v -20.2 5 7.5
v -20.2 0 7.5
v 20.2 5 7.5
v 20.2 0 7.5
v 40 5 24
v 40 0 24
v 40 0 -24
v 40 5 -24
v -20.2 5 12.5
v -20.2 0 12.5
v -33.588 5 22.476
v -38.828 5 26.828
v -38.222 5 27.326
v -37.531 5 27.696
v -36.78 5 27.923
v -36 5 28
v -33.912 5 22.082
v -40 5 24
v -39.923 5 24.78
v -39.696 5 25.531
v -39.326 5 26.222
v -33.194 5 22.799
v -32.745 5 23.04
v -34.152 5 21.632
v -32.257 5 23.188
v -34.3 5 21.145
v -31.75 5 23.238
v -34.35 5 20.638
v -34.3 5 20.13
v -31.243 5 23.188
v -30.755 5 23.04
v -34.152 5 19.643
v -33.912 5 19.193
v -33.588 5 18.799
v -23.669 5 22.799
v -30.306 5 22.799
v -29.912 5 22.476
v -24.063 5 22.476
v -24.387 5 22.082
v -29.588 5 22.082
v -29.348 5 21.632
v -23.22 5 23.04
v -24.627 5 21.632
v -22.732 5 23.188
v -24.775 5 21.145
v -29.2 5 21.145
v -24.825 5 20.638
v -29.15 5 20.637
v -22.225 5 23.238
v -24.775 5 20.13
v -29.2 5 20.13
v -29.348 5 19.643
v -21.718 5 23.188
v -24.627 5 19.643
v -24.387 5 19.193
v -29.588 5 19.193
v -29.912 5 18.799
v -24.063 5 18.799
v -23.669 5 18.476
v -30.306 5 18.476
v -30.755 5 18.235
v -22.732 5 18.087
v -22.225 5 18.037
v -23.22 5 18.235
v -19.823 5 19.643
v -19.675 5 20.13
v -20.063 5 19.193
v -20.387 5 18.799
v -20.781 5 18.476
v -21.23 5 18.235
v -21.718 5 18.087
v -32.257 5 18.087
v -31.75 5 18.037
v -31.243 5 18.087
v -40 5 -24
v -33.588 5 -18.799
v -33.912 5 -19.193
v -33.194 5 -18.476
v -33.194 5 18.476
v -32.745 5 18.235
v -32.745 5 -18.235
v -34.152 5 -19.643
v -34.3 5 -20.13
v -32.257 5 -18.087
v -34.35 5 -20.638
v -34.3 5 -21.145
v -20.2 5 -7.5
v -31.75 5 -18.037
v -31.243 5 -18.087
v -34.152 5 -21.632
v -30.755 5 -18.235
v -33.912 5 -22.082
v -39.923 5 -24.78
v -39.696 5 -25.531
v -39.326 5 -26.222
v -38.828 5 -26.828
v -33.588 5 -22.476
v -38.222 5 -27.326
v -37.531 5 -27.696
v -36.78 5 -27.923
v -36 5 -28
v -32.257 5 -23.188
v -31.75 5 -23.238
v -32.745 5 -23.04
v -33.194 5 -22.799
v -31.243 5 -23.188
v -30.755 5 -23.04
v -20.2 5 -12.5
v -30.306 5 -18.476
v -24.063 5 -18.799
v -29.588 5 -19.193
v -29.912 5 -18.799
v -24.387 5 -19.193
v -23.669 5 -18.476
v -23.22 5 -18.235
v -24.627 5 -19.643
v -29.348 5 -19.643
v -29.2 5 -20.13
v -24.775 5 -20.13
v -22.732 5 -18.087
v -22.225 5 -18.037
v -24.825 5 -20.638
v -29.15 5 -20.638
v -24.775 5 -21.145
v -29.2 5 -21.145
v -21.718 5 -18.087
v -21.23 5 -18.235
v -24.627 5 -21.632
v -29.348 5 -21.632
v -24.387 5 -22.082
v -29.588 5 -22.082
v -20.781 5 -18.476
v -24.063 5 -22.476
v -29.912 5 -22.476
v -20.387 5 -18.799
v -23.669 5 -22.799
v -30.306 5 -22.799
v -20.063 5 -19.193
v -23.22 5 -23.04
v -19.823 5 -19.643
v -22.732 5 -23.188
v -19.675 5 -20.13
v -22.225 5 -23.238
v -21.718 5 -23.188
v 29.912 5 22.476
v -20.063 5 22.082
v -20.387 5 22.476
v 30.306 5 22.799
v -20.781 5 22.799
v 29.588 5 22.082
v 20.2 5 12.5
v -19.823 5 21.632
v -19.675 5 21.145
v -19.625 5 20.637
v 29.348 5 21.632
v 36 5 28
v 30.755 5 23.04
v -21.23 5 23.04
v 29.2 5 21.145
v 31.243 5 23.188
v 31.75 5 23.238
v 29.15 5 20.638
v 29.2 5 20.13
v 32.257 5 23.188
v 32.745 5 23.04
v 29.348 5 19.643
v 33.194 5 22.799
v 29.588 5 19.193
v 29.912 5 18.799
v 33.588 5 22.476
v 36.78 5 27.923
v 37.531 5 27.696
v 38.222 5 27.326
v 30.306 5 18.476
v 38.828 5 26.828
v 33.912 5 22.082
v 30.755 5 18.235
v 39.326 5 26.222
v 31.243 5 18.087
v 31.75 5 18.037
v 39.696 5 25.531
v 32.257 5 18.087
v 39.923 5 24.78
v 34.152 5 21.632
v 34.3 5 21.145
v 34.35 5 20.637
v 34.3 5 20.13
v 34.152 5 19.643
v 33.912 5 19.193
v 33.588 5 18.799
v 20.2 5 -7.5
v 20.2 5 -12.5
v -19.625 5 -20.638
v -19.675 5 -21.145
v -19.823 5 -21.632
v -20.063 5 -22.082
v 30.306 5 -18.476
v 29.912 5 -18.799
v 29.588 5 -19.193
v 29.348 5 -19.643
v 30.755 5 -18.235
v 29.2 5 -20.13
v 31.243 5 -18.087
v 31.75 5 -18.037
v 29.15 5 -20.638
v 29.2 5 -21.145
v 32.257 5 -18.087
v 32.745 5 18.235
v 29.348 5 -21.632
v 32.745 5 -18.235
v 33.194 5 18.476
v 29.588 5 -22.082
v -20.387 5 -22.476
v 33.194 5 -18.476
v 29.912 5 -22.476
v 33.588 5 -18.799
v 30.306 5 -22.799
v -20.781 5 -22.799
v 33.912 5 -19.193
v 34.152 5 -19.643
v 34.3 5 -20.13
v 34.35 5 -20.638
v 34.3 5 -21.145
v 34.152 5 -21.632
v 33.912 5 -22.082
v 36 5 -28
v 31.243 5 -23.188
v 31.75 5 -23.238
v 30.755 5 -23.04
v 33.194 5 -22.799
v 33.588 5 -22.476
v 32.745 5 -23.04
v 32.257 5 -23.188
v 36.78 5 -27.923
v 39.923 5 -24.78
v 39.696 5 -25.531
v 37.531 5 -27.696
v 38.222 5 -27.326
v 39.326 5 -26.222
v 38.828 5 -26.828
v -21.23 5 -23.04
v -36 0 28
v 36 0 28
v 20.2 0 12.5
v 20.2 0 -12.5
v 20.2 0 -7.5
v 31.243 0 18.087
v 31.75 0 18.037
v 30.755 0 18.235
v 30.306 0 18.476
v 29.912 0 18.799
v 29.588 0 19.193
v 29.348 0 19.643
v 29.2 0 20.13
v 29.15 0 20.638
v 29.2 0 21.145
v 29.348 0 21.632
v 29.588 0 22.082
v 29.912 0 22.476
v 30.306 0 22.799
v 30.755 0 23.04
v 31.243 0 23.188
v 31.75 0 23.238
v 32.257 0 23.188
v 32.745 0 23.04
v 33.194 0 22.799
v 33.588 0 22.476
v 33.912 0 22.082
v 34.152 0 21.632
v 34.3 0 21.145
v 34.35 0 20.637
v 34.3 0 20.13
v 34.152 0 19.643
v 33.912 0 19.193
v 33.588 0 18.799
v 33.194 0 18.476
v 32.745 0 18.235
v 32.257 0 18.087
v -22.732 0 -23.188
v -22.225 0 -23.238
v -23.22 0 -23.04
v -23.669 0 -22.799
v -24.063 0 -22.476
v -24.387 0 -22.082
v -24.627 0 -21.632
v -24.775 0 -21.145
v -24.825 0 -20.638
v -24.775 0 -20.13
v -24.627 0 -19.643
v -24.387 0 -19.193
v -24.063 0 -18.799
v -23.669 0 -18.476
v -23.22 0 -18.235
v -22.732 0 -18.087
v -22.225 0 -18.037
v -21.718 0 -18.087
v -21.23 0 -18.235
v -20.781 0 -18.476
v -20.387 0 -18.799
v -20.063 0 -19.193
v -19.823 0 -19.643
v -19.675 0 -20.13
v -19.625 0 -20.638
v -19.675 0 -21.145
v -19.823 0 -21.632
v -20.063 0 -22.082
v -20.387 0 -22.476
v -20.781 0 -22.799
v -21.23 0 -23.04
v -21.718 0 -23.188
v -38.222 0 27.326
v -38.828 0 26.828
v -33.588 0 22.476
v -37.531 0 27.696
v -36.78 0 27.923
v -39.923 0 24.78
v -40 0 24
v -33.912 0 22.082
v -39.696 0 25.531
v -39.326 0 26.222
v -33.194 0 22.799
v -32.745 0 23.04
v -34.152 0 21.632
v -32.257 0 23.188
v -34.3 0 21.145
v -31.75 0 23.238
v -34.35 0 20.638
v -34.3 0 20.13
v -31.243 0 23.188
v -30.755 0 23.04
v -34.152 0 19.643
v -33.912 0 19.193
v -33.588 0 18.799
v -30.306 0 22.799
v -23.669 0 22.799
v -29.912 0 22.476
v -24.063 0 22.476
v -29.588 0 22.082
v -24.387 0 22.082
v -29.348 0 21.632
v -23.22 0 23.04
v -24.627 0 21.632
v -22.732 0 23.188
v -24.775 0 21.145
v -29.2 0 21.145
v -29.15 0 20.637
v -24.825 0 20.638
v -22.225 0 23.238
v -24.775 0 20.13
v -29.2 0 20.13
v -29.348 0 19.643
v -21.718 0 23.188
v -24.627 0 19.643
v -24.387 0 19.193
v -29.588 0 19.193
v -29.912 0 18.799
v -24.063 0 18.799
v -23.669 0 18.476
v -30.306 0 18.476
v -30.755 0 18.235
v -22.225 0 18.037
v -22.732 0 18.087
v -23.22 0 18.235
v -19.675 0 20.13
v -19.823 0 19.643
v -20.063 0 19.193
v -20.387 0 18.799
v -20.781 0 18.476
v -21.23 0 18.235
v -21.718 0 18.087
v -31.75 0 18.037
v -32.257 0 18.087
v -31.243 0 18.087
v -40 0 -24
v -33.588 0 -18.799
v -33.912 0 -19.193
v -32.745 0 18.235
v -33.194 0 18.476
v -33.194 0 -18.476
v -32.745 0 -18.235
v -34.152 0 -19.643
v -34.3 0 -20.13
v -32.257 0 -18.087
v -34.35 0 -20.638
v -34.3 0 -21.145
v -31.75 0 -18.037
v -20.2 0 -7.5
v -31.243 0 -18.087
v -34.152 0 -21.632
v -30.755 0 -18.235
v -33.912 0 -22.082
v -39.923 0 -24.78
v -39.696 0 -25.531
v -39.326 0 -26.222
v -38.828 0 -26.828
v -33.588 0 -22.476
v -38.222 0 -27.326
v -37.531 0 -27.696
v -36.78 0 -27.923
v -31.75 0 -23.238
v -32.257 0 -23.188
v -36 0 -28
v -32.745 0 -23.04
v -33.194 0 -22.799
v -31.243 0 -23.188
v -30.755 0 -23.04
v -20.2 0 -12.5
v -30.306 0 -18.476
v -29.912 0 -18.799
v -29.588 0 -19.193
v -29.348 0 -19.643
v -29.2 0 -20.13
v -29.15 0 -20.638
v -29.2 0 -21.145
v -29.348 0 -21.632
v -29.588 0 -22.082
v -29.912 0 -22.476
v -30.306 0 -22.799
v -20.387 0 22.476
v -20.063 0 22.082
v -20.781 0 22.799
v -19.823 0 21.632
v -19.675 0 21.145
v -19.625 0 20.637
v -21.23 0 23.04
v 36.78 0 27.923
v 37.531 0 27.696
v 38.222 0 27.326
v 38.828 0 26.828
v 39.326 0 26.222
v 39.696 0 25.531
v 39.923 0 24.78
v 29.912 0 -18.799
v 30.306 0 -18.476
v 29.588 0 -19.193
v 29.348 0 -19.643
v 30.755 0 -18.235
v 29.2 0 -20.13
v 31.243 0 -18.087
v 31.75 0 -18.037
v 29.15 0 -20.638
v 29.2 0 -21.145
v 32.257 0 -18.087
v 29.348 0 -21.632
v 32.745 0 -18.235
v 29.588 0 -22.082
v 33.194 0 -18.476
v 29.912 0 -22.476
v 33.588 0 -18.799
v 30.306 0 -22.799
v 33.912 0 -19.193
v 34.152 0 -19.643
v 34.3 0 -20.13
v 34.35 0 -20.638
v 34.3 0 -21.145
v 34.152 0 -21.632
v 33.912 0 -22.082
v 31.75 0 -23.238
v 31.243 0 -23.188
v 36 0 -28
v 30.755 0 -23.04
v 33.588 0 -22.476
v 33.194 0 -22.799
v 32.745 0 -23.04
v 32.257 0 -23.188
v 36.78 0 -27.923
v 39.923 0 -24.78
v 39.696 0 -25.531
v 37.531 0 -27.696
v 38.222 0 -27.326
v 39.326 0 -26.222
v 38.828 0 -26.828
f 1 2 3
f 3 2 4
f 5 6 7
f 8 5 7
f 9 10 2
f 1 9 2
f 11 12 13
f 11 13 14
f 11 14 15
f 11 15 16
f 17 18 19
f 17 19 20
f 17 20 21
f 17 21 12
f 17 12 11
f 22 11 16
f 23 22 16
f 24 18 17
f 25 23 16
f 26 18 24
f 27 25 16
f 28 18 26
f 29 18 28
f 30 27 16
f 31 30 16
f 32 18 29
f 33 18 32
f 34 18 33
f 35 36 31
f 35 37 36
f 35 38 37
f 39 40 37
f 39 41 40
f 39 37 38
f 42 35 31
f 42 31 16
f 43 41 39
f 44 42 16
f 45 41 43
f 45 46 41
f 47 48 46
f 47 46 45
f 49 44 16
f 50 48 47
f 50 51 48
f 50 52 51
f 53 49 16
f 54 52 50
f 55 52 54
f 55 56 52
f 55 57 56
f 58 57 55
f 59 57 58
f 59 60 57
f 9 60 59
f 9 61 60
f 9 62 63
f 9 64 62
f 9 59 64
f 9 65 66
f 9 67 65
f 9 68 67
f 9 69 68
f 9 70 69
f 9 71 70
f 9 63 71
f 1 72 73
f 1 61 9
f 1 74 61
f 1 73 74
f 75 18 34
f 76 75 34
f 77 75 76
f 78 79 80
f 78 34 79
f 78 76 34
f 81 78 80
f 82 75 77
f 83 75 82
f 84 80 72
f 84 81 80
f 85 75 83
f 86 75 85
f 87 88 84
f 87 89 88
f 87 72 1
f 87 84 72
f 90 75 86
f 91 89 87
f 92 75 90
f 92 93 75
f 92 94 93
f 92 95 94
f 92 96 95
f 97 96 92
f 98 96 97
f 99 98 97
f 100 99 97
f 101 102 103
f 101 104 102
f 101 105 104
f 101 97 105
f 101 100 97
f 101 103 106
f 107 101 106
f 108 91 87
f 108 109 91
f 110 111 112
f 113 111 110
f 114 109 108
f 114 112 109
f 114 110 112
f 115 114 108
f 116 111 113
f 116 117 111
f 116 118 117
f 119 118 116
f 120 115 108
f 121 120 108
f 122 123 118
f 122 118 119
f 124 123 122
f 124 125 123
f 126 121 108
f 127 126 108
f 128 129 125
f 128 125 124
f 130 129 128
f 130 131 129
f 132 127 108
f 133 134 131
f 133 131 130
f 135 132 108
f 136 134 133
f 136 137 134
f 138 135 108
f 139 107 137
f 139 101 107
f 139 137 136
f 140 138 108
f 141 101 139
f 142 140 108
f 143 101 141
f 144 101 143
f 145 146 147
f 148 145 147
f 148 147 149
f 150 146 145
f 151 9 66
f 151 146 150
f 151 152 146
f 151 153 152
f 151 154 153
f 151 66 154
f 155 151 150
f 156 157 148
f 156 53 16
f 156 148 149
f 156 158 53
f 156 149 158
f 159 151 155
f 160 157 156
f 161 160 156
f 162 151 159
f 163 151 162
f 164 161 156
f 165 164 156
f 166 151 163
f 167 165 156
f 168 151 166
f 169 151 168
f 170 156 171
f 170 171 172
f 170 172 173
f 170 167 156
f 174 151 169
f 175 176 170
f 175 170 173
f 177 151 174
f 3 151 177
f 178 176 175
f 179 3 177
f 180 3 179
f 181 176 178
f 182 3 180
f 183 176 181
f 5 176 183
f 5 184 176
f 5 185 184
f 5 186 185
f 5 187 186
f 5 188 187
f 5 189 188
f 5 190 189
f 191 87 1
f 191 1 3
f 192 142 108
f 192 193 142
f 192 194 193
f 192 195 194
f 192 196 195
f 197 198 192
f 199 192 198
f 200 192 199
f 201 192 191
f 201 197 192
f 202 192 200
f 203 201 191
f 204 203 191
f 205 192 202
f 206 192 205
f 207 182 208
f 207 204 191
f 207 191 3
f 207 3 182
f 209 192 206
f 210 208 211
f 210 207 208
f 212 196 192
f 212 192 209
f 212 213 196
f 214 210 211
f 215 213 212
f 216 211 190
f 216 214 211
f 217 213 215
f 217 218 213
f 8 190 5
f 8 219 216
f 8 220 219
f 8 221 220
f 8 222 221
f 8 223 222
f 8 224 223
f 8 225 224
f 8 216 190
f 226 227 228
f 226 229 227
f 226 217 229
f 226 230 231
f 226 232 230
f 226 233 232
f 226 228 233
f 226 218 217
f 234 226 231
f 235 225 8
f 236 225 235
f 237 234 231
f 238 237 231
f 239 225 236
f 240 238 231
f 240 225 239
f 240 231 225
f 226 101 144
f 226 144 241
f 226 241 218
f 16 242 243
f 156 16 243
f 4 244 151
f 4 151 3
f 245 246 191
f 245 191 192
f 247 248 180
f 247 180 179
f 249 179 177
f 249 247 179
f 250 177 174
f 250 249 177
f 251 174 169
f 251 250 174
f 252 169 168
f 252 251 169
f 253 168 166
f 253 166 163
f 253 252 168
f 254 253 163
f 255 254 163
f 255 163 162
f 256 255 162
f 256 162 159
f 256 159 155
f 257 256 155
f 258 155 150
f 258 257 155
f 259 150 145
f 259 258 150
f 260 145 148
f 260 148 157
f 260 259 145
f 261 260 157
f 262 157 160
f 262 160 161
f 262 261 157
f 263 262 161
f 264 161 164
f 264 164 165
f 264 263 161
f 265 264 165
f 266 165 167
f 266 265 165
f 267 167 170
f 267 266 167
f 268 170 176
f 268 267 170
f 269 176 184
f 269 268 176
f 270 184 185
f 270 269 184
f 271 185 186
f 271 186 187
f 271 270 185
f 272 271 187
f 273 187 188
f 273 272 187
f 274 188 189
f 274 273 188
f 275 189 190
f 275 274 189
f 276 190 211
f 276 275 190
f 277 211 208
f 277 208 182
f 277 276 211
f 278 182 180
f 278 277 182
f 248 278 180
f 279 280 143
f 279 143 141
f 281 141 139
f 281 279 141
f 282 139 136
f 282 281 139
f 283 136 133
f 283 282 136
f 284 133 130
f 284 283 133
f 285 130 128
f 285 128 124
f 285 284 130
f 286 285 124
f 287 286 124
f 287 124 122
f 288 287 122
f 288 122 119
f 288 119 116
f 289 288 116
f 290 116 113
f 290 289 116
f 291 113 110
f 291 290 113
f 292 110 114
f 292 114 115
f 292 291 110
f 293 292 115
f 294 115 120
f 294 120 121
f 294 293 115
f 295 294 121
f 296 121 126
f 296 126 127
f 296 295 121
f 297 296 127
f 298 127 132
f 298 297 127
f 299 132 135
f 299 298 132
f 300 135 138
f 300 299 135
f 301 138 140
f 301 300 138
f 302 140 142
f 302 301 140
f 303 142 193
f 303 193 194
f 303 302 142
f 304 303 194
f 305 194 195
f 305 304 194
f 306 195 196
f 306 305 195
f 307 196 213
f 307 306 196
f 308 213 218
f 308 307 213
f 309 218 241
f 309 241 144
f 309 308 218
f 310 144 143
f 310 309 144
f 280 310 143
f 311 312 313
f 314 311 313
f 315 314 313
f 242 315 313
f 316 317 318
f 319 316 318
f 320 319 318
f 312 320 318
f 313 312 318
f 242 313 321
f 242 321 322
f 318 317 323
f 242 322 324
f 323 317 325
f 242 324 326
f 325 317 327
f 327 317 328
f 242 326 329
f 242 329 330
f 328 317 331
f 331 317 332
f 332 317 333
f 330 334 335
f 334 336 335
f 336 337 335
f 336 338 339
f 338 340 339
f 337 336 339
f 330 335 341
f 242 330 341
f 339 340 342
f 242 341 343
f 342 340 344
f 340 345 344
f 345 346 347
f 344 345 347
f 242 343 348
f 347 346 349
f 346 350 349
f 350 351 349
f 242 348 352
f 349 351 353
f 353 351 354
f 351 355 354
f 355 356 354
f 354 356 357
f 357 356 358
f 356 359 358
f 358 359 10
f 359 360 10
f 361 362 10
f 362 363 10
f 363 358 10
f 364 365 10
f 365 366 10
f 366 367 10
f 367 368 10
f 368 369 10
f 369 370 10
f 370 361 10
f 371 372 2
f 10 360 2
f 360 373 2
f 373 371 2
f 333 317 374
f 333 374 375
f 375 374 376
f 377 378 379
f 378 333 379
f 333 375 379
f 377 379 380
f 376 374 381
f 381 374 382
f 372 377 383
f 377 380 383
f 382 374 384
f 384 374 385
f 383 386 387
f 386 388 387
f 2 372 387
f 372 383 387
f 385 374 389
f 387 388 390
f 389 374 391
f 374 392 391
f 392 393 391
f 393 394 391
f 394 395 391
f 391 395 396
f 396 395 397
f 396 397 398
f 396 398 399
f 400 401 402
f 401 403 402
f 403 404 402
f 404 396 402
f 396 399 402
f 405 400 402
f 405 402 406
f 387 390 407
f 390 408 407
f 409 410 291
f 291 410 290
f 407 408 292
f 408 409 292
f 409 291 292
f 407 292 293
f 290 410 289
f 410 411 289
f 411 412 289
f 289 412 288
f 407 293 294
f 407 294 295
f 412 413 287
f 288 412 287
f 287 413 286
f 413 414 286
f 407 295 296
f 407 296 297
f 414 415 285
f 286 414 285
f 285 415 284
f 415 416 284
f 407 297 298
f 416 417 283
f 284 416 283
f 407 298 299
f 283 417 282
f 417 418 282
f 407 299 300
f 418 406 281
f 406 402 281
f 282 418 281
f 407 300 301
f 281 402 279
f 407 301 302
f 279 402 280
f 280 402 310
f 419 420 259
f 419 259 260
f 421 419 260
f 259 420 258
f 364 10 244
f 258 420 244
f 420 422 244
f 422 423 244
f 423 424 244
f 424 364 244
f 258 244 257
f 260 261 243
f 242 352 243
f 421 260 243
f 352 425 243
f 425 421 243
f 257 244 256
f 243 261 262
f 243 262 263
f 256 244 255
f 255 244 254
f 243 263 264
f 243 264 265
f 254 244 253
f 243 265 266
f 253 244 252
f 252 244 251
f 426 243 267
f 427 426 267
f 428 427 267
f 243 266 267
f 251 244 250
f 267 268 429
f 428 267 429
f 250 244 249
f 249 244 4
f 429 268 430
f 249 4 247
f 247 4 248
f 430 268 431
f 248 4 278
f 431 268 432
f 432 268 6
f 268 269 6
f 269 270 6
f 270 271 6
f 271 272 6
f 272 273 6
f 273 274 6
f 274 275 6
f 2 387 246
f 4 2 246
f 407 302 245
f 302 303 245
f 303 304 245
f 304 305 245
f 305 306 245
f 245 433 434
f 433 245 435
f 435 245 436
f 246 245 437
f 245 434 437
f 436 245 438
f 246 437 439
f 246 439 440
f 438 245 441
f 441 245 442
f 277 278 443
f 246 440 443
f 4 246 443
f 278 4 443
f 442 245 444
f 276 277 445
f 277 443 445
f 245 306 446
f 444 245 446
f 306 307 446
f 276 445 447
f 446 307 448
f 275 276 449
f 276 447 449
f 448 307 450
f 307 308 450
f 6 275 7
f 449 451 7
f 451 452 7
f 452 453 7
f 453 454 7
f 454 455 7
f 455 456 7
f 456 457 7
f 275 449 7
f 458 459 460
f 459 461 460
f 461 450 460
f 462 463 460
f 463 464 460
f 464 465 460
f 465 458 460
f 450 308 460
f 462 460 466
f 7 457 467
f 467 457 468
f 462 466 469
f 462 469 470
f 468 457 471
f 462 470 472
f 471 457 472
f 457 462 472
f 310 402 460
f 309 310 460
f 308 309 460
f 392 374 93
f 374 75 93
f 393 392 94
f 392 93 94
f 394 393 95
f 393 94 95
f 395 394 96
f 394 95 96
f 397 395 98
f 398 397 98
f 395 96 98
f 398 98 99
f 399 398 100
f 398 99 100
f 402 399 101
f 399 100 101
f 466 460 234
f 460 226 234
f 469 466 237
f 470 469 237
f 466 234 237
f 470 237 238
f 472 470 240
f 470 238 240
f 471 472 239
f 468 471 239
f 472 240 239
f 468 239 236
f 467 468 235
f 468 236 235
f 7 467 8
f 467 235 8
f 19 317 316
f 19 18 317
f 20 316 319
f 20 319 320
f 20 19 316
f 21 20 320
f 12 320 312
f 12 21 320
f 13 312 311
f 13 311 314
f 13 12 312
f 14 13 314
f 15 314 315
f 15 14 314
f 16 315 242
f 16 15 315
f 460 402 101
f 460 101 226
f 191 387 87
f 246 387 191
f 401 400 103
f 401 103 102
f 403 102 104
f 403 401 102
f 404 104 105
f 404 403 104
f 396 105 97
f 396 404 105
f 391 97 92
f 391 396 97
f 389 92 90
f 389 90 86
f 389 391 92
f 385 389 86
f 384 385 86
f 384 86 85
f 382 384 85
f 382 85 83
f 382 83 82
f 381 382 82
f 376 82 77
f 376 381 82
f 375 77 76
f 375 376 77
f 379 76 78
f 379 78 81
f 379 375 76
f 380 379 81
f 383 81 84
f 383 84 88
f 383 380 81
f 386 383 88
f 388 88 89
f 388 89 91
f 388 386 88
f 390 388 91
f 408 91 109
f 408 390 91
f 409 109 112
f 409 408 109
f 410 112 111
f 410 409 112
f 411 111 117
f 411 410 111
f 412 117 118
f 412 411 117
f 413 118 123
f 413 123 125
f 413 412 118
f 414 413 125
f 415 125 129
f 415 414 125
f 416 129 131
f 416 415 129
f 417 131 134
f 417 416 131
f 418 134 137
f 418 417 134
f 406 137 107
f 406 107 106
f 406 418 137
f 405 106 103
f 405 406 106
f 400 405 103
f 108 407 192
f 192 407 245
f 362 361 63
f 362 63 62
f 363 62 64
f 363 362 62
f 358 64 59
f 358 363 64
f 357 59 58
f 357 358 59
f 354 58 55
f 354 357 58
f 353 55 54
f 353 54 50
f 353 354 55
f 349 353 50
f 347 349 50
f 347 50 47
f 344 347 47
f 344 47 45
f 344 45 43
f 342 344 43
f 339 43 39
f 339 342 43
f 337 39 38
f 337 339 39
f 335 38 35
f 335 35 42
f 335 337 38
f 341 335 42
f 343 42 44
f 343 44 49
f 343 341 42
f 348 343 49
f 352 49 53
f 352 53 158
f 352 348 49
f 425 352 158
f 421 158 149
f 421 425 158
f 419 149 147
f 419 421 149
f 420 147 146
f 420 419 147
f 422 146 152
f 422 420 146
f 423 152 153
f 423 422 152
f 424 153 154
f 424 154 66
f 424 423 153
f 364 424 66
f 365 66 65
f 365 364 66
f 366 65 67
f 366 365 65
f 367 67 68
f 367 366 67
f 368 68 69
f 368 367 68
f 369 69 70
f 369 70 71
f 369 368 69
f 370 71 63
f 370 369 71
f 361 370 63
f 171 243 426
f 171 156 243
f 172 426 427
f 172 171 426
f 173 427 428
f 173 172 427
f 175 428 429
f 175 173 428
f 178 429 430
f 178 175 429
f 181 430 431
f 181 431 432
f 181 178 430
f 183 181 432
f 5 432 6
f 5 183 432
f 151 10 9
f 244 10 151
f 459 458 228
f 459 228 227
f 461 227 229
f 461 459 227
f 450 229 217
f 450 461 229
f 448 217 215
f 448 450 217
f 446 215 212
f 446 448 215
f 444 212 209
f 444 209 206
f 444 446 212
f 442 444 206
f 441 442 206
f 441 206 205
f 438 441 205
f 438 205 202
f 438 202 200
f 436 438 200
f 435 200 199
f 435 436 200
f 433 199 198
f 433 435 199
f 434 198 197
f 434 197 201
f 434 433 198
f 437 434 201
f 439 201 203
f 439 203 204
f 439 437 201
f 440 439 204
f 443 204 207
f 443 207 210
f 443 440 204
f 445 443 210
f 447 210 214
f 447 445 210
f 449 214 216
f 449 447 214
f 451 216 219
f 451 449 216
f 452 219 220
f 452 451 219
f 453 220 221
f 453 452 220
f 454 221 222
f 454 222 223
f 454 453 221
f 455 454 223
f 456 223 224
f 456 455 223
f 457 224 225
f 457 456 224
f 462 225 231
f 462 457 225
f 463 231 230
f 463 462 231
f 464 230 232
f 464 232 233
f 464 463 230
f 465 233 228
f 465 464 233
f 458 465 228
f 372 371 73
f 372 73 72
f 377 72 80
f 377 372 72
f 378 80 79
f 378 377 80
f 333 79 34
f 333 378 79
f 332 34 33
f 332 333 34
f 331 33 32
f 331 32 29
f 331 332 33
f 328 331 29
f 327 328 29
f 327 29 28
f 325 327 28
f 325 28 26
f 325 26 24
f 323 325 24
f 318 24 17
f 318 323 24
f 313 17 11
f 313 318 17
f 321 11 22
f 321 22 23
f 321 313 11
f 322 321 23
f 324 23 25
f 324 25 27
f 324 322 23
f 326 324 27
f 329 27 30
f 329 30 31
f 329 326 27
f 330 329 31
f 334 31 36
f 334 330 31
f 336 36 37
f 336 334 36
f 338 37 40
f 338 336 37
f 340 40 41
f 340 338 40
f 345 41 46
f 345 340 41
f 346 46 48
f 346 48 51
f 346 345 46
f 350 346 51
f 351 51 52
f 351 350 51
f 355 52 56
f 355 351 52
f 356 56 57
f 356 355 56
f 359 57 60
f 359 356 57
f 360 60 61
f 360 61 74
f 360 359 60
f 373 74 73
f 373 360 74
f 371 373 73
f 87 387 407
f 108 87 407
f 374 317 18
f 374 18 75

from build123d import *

# Parameters (mm, degrees)
SKETCH_3_W          = 80
SKETCH_3_H          = 56
EXTRUDE_1_DEPTH     = 5
SKETCH_1_R          = 2.6
SKETCH_1_W          = 40.4
SKETCH_1_H          = 5
CUT_EXTRUDE_1_DEPTH = 5
FILLET_2_R          = 4


with BuildPart() as part:
    # 草图3 → 凸台-拉伸1 (new body)
    with BuildSketch(Plane(origin=(0, 0, 0), x_dir=(1, 0, 0), z_dir=(0, 1, 0))):
        Rectangle(SKETCH_3_W, SKETCH_3_H)
    extrude(amount=EXTRUDE_1_DEPTH)

    # 草图1 → 切除-拉伸1 (cut)
    with BuildSketch(Plane(origin=(0, 0, 0), x_dir=(1, 0, 0), z_dir=(0, 1, 0))):
        with Locations(Location((-31.75, 20.6375, 0), (0, 0, 90))):
            Circle(SKETCH_1_R)
        with Locations(Location((31.75, 20.6375, 0), (0, 0, 90))):
            Circle(SKETCH_1_R)
        with Locations(Location((31.75, -20.6375, 0), (0, 0, 90))):
            Circle(SKETCH_1_R)
        with Locations(Location((-31.75, -20.6375, 0), (0, 0, 90))):
            Circle(SKETCH_1_R)
        with Locations(Location((-22.225, 20.6375, 0), (0, 0, 90))):
            Circle(SKETCH_1_R)
        with Locations(Location((-22.225, -20.6375, 0), (0, 0, 90))):
            Circle(SKETCH_1_R)
        with Locations((0, -10)):
            Rectangle(SKETCH_1_W, SKETCH_1_H)
        with Locations((0, 10)):
            Rectangle(SKETCH_1_W, SKETCH_1_H)
    extrude(amount=CUT_EXTRUDE_1_DEPTH, mode=Mode.SUBTRACT)

    # 圆角2
    fillet_2_edges = [part.edges().sort_by_distance(p)[0] for p in [
        (40, 2.5, 28),
        (-40, 2.5, 28),
        (-40, 2.5, -28),
        (40, 2.5, -28),
    ]]
    fillet(fillet_2_edges, radius=FILLET_2_R)


solid = part.part
